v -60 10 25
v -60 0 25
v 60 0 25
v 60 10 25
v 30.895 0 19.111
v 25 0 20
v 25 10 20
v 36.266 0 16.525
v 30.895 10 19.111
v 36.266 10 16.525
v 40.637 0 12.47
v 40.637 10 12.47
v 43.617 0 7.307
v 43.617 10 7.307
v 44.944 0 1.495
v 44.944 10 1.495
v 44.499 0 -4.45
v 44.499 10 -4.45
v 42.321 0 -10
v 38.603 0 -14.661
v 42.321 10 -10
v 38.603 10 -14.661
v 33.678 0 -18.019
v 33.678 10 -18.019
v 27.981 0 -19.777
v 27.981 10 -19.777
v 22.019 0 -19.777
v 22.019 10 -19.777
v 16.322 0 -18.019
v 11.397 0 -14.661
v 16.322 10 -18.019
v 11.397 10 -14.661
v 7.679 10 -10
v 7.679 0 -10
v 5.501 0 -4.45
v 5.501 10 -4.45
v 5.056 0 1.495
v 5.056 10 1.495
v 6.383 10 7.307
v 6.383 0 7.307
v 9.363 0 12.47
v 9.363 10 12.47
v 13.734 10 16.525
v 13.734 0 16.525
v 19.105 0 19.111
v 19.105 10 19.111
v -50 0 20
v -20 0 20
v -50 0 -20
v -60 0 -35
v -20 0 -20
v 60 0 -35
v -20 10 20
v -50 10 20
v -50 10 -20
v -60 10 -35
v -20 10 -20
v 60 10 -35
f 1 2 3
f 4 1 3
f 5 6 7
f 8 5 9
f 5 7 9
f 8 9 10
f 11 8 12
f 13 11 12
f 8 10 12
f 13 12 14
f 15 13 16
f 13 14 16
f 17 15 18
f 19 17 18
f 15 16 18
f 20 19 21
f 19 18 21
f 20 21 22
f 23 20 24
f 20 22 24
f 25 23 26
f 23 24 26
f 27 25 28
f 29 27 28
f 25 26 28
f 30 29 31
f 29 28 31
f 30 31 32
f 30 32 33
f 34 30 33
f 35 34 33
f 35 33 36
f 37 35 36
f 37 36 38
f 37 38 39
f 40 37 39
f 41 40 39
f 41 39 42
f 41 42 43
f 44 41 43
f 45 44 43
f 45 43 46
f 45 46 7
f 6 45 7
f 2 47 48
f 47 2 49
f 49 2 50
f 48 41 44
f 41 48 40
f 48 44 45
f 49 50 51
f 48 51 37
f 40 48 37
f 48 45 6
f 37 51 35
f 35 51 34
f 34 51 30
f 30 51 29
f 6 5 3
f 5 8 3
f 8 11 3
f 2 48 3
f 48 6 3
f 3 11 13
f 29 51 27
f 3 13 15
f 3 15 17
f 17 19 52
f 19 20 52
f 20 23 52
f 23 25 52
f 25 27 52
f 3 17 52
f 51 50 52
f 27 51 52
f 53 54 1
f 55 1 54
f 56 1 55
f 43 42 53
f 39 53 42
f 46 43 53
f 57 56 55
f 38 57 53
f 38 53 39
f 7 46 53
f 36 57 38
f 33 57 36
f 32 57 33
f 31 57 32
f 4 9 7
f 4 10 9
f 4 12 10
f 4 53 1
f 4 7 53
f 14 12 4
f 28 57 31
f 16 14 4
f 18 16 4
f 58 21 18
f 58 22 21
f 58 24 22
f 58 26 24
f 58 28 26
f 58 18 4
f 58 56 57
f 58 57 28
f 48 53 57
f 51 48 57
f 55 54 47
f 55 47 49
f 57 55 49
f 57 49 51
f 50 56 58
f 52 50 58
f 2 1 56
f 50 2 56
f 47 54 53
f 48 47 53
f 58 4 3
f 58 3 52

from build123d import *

# Parameters (mm, degrees)
SKIZZE1_W                       = 120
SKIZZE1_H                       = 50
AUFSATZ_LINEAR_AUSTRAGEN1_DEPTH = 10
SKIZZE3_R                       = 20
SKIZZE3_W                       = 30
SKIZZE3_H                       = 40
SCHNITT_LINEAR_AUSTRAGEN1_DEPTH = 66.76473219
SKIZZE4_W                       = 120
SKIZZE4_H                       = 10
AUFSATZ_LINEAR_AUSTRAGEN2_DEPTH = 10


with BuildPart() as part:
    # Skizze1 → Aufsatz-Linear austragen1 (new body)
    with BuildSketch(Plane(origin=(0, 0, 0), x_dir=(1, 0, 0), z_dir=(0, 1, 0))):
        Rectangle(SKIZZE1_W, SKIZZE1_H)
    extrude(amount=AUFSATZ_LINEAR_AUSTRAGEN1_DEPTH)

    # Skizze3 → Schnitt-Linear austragen1 (cut, through all)
    with BuildSketch(Plane(origin=(0, 10, 0), x_dir=(1, 0, 0), z_dir=(0, 1, 0))):
        with Locations(Location((25, 0, 0), (0, 0, 270))):
            Circle(SKIZZE3_R)
        with Locations((-35, 0)):
            Rectangle(SKIZZE3_W, SKIZZE3_H)
    extrude(amount=-SCHNITT_LINEAR_AUSTRAGEN1_DEPTH, mode=Mode.SUBTRACT)

    # Skizze4 → Aufsatz-Linear austragen2 (add)
    with BuildSketch(Plane(origin=(0, 10, 0), x_dir=(1, 0, 0), z_dir=(0, 1, 0))):
        with Locations((0, 30)):
            Rectangle(SKIZZE4_W, SKIZZE4_H)
    extrude(amount=-AUFSATZ_LINEAR_AUSTRAGEN2_DEPTH)


solid = part.part
